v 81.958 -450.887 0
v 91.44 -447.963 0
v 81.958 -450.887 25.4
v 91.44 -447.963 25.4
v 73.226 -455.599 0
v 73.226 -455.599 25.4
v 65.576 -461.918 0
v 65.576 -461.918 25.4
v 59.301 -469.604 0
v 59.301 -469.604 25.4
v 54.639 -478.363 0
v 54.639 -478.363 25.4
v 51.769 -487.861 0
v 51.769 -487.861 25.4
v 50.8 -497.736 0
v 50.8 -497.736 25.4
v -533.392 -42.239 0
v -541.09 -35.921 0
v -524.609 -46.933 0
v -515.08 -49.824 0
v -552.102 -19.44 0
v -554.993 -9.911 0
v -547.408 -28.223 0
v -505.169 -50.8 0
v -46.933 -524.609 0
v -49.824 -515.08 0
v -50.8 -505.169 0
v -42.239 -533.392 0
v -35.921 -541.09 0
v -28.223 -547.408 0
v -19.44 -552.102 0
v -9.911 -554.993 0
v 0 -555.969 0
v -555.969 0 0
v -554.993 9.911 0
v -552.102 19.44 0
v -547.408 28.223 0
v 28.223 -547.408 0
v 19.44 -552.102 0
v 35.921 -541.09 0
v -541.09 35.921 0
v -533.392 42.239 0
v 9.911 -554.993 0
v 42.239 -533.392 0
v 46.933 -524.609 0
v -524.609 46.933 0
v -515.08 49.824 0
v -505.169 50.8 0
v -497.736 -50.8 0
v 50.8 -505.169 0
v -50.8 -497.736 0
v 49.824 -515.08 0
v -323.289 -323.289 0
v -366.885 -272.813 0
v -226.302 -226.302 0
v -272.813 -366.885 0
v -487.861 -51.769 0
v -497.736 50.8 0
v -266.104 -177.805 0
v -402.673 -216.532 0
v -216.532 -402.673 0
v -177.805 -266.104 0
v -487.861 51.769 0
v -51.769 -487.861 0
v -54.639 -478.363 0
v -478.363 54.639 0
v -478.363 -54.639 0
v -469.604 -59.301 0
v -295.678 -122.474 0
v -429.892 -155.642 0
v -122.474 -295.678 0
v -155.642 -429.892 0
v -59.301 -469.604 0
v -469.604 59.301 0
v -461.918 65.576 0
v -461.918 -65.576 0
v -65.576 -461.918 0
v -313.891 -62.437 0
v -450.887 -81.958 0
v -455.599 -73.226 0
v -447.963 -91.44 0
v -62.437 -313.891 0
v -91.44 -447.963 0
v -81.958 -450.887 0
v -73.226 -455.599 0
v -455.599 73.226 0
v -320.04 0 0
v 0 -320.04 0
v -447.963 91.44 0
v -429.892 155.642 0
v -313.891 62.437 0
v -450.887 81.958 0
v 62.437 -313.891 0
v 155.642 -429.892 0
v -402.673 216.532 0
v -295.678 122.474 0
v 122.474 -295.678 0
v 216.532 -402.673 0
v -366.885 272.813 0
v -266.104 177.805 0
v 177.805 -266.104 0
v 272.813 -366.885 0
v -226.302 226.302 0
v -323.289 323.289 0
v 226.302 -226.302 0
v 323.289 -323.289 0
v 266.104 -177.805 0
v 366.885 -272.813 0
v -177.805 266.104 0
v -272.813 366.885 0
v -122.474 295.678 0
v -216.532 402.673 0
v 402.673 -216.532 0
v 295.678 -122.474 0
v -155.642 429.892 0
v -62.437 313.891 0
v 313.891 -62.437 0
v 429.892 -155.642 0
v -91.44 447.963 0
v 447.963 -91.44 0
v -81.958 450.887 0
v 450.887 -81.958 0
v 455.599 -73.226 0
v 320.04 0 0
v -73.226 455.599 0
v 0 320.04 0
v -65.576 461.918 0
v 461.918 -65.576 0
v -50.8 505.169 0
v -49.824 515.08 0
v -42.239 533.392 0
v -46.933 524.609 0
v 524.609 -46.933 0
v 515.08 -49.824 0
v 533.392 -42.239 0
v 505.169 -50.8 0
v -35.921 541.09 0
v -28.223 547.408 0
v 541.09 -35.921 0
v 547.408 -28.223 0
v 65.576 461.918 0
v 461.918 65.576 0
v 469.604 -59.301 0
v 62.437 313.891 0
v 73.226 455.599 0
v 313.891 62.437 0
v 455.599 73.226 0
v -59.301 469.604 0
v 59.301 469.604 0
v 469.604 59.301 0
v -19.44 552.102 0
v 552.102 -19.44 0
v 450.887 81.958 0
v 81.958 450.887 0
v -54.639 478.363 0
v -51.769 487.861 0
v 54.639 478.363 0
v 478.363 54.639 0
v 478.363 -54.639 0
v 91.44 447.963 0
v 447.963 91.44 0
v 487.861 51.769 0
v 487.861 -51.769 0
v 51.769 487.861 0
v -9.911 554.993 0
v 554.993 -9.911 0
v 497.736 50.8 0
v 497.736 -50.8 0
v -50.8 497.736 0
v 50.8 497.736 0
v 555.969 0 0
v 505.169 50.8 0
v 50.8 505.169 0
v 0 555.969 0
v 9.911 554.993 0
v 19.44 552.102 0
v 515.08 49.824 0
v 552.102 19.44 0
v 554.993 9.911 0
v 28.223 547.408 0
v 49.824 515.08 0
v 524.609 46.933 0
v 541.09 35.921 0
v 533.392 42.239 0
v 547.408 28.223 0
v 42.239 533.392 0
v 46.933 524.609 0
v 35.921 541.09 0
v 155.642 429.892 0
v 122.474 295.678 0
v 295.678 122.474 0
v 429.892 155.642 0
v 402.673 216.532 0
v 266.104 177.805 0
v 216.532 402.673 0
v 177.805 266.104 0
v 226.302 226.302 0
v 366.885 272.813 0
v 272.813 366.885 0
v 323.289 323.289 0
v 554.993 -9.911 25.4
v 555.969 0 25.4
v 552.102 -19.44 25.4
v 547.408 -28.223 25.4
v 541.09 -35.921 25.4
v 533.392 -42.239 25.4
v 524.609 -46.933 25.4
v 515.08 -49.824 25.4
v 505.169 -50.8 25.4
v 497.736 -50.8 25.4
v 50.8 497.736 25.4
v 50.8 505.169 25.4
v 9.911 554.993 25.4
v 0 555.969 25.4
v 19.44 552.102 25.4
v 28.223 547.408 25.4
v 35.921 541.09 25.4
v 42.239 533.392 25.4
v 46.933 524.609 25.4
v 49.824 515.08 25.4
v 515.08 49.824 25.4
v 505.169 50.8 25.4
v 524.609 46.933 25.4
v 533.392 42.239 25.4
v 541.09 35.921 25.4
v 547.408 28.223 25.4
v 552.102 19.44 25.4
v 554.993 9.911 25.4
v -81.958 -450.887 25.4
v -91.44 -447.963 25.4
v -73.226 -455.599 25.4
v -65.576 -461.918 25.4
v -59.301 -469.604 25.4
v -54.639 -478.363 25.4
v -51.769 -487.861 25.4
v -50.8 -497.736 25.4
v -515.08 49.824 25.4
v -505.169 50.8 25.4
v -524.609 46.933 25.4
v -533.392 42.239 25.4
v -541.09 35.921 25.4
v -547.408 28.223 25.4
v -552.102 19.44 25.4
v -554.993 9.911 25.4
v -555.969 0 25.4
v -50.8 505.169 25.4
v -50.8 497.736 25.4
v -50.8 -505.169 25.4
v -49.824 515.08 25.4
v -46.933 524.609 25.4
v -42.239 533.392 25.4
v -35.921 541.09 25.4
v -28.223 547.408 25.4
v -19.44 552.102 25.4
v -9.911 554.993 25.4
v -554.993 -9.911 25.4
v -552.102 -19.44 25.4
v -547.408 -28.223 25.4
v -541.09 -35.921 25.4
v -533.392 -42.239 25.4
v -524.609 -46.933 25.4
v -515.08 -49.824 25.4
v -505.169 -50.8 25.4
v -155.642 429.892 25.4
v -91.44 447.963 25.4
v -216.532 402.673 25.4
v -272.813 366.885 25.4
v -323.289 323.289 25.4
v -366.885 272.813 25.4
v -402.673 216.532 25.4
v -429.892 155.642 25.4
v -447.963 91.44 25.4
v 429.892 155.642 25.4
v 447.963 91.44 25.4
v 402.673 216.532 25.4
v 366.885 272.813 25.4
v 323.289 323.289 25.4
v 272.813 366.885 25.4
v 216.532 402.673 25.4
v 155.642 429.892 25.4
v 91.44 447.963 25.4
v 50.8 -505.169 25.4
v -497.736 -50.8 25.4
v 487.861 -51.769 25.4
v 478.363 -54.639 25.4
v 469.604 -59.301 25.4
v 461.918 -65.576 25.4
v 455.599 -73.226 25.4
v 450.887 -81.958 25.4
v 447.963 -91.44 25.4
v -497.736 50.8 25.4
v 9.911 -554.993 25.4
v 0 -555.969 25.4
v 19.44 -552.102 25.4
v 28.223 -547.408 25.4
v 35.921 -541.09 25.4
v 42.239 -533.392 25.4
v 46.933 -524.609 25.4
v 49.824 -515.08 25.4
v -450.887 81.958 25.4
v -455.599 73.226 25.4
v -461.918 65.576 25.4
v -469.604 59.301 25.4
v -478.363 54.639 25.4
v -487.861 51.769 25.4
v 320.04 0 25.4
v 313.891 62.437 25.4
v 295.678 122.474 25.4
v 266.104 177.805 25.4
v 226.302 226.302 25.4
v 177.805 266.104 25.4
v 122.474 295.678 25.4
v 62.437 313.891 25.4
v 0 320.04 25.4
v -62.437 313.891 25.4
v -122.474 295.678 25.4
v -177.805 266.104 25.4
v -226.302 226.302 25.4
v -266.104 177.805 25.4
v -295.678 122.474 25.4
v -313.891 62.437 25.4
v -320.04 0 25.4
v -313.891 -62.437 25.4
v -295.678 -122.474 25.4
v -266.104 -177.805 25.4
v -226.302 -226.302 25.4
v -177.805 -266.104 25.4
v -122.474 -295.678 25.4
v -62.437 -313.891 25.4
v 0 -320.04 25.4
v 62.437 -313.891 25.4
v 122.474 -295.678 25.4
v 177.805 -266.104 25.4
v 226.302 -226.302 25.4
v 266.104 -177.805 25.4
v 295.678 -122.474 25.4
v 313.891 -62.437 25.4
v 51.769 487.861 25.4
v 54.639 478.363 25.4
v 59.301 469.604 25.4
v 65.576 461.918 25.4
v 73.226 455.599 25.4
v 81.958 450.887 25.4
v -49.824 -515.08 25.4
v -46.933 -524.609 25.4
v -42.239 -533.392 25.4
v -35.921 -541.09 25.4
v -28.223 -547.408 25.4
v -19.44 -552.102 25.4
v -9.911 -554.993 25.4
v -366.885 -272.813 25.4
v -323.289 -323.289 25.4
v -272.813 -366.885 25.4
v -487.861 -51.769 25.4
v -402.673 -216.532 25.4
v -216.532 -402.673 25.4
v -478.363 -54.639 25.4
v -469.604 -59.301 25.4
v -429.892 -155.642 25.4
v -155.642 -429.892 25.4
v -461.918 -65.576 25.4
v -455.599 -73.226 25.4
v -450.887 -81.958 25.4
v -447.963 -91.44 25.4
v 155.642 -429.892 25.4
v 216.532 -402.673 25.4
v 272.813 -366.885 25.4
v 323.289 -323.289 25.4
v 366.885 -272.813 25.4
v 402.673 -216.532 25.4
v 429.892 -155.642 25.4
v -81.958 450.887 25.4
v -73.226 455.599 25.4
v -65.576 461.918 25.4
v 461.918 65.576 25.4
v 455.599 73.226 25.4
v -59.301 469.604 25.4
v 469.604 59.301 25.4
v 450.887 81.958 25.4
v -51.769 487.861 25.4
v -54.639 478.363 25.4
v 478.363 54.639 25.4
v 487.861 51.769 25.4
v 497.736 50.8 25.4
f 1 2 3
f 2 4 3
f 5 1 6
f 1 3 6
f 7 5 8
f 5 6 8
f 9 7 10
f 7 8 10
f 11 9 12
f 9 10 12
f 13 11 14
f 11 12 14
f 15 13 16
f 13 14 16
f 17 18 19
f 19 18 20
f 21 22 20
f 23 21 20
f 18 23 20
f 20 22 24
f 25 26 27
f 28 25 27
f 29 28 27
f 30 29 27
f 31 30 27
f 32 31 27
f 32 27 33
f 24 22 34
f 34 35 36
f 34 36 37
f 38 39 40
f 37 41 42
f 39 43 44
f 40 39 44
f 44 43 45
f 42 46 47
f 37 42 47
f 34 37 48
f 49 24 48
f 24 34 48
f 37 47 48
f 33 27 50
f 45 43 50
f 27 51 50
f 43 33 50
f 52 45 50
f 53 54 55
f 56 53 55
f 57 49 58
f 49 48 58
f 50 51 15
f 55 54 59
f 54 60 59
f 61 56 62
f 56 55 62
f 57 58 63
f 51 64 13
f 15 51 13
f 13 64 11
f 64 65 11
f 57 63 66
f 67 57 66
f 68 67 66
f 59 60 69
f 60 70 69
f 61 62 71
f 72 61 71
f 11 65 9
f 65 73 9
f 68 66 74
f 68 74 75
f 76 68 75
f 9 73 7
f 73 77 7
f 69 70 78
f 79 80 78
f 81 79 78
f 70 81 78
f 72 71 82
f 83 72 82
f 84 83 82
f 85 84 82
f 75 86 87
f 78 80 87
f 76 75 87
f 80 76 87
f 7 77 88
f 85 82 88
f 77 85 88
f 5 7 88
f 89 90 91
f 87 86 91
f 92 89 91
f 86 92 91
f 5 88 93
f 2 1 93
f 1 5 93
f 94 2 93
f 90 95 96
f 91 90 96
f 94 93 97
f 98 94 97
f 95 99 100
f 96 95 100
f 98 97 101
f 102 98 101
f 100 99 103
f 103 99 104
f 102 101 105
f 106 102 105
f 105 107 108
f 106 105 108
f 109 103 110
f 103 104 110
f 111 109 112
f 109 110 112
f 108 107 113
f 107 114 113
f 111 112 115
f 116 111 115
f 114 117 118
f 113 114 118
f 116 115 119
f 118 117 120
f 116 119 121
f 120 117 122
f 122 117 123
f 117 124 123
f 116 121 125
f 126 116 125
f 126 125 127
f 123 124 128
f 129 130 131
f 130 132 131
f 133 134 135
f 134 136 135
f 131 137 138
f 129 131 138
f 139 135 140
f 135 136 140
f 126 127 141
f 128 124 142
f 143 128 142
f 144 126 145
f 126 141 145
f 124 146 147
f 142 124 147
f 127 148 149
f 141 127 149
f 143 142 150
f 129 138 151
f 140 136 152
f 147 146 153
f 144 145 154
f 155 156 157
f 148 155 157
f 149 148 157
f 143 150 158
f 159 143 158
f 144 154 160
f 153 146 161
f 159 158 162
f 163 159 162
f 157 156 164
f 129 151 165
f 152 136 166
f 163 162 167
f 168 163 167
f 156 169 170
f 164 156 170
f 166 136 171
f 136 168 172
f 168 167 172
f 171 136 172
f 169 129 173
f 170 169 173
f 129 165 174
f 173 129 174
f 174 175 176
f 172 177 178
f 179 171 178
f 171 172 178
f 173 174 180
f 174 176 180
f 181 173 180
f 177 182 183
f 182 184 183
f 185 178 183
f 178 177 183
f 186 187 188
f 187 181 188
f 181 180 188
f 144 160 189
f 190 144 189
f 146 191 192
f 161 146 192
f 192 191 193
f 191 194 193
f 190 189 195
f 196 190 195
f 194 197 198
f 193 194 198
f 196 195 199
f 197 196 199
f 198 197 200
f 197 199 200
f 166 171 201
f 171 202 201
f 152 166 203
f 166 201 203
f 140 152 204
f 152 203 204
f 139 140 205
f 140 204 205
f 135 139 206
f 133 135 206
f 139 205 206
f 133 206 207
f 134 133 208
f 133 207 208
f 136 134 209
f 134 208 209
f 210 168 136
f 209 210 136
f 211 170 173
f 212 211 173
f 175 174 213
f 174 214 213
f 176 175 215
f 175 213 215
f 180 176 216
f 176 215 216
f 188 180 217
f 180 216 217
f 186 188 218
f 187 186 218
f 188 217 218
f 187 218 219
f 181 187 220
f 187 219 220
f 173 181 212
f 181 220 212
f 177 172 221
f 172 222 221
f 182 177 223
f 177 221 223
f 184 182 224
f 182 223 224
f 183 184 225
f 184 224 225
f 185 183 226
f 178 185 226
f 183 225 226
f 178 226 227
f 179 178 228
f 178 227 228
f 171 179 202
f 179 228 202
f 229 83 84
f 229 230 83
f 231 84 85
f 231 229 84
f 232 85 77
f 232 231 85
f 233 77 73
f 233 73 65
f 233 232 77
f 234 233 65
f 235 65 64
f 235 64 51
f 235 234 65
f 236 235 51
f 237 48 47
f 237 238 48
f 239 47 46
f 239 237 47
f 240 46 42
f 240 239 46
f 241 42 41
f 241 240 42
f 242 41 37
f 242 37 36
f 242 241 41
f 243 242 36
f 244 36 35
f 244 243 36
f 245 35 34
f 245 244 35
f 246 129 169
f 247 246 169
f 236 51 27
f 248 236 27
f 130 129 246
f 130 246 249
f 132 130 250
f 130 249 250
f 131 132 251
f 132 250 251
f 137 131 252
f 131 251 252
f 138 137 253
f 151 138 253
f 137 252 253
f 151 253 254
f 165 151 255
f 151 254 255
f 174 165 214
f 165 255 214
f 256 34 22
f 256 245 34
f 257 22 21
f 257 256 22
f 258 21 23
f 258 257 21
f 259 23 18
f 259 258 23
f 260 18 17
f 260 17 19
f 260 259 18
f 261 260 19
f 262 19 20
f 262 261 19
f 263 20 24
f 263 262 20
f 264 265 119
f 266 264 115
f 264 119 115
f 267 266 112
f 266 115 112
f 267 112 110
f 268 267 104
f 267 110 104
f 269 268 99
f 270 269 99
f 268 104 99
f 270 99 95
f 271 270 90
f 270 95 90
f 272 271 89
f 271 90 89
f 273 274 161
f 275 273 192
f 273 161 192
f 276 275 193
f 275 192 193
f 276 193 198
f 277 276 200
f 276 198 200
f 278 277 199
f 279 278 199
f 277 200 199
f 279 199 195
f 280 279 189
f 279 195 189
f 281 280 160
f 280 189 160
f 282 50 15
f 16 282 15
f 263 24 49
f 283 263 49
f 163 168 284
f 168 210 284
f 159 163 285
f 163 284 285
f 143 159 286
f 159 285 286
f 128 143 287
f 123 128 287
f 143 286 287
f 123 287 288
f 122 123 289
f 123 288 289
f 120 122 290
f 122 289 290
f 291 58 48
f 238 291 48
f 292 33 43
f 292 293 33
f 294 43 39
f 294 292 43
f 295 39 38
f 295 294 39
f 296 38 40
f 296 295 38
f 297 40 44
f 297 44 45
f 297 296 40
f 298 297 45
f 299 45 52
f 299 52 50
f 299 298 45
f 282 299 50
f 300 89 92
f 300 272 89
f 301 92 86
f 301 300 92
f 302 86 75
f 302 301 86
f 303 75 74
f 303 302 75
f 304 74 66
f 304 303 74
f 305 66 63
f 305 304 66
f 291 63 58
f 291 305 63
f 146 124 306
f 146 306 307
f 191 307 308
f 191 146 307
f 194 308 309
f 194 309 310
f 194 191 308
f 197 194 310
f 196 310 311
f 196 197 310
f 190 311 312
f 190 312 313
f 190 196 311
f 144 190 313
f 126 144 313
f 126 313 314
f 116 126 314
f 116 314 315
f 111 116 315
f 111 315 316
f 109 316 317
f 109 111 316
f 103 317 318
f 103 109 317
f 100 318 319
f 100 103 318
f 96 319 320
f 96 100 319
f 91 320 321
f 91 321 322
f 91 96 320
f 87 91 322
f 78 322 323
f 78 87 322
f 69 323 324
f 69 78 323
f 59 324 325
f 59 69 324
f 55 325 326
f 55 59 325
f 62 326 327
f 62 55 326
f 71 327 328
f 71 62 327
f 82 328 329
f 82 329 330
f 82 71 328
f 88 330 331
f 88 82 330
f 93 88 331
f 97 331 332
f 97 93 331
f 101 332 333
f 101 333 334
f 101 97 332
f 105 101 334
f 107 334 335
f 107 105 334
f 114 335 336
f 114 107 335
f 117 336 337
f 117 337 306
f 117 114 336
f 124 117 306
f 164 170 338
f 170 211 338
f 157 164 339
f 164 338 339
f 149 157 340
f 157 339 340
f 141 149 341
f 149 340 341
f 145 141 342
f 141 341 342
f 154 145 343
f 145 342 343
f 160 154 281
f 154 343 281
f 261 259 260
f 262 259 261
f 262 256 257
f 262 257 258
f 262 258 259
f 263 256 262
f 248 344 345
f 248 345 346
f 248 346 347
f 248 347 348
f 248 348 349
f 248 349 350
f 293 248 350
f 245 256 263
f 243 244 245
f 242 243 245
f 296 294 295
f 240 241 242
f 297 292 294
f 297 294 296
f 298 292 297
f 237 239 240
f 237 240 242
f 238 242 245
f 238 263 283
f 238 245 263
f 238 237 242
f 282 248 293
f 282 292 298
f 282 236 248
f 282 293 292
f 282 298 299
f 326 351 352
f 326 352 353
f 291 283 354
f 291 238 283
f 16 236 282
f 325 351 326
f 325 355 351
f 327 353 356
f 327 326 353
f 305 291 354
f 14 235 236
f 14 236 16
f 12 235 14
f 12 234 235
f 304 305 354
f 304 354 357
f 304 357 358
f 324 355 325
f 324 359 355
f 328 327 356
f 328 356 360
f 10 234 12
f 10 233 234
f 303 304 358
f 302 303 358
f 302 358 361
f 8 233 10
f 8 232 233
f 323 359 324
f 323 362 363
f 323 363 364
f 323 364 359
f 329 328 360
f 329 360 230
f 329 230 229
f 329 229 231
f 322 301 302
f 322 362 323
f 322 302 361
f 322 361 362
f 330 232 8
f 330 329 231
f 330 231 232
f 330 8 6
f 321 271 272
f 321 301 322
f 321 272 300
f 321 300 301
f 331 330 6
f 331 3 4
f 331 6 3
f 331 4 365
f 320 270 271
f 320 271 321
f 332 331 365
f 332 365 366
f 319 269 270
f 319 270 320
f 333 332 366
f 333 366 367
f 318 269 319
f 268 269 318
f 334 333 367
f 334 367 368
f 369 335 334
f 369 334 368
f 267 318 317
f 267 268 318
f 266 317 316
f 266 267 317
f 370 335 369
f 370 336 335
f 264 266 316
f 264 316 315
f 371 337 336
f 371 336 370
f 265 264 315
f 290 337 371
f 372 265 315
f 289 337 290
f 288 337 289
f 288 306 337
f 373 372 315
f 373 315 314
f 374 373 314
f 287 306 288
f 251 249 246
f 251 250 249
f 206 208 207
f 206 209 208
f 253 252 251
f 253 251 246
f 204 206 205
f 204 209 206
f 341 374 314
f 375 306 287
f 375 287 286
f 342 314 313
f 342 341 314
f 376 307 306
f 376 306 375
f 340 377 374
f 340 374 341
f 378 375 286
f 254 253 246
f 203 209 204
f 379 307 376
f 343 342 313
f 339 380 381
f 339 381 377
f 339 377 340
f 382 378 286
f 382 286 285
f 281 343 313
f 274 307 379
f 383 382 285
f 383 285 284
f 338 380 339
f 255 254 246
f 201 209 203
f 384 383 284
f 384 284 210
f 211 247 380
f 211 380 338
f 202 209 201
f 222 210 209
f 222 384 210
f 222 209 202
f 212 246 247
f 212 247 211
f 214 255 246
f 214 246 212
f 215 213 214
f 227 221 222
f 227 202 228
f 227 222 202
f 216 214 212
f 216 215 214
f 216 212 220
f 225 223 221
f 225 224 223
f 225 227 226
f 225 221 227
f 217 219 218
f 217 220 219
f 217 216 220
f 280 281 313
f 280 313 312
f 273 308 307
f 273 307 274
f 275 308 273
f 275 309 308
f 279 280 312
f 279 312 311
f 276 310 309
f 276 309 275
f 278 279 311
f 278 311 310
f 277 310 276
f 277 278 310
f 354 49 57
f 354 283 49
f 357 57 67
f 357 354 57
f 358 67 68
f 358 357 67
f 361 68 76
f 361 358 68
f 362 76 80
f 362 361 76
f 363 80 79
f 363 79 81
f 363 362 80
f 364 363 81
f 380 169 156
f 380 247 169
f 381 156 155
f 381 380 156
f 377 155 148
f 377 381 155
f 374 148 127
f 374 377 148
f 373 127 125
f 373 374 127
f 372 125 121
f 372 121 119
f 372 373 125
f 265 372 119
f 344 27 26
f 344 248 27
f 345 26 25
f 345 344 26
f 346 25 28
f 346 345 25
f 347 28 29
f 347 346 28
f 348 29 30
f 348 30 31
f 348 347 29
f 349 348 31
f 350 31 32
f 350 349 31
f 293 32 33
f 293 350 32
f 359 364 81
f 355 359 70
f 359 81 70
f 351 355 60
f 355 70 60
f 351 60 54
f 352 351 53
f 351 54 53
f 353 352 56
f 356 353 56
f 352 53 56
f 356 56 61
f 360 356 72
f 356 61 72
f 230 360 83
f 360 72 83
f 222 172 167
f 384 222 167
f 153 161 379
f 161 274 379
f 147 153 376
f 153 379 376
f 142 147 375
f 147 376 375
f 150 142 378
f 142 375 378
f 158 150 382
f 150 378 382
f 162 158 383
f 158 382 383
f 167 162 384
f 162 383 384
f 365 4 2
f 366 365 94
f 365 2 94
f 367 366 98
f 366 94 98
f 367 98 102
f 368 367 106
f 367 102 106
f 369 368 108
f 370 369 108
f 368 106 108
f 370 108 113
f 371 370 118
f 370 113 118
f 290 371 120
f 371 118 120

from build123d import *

# Parameters (mm, degrees)
F0_R     = 320.04
F1_DEPTH = 25.4
F2_R     = 50.79999


# Not quite as in the source:
# - a fillet or chamfer is up to 0.001 mm smaller than in the source, because OpenCascade refuses the exact size


with BuildPart() as f1:
    # F0 (on Top) → F1 (new body)
    with BuildSketch(Plane.XY):
        with BuildLine():
            Line((-50.8, 555.969013028), (-50.8, 454.369013028))
            ThreePointArc((-50.8, 454.369013028), (-323.2892203585, 323.2892203585), (-454.369013028, 50.8))
            Line((-454.369013028, 50.8), (-555.969013028, 50.8))
            Line((-555.969013028, 50.8), (-555.969013028, -50.8))
            Line((-555.969013028, -50.8), (-454.369013028, -50.8))
            ThreePointArc((-454.369013028, -50.8), (-323.2892203585, -323.2892203585), (-50.8, -454.369013028))
            Line((-50.8, -454.369013028), (-50.8, -555.969013028))
            Line((-50.8, -555.969013028), (50.8, -555.969013028))
            Line((50.8, -555.969013028), (50.8, -454.369013028))
            ThreePointArc((50.8, -454.369013028), (323.2892203585, -323.2892203585), (454.369013028, -50.8))
            Line((454.369013028, -50.8), (555.969013028, -50.8))
            Line((555.969013028, -50.8), (555.969013028, 50.8))
            Line((555.969013028, 50.8), (454.369013028, 50.8))
            ThreePointArc((454.369013028, 50.8), (323.2892203585, 323.2892203585), (50.8, 454.369013028))
            Line((50.8, 454.369013028), (50.8, 555.969013028))
            Line((50.8, 555.969013028), (-50.8, 555.969013028))
        make_face()
        Circle(F0_R, mode=Mode.SUBTRACT)
    extrude(amount=F1_DEPTH)

    # F2 (radius 50.8 in the source; OpenCascade refuses exactly that, so slightly less here)
    f2_edges = [f1.edges().sort_by_distance(p)[0] for p in [
        (50.8, -555.969013, 12.7),
        (-50.8, -555.969013, 12.7),
        (555.969013, -50.8, 12.7),
        (555.969013, 50.8, 12.7),
        (50.8, 555.969013, 12.7),
        (-50.8, 555.969013, 12.7),
        (-555.969013, 50.8, 12.7),
        (-555.969013, -50.8, 12.7),
        (50.8, -454.369013, 12.7),
        (454.369013, -50.8, 12.7),
        (454.369013, 50.8, 12.7),
        (50.8, 454.369013, 12.7),
        (-50.8, 454.369013, 12.7),
        (-454.369013, 50.8, 12.7),
        (-454.369013, -50.8, 12.7),
        (-50.8, -454.369013, 12.7),
    ]]
    fillet(f2_edges, radius=F2_R)


solid = f1.part
